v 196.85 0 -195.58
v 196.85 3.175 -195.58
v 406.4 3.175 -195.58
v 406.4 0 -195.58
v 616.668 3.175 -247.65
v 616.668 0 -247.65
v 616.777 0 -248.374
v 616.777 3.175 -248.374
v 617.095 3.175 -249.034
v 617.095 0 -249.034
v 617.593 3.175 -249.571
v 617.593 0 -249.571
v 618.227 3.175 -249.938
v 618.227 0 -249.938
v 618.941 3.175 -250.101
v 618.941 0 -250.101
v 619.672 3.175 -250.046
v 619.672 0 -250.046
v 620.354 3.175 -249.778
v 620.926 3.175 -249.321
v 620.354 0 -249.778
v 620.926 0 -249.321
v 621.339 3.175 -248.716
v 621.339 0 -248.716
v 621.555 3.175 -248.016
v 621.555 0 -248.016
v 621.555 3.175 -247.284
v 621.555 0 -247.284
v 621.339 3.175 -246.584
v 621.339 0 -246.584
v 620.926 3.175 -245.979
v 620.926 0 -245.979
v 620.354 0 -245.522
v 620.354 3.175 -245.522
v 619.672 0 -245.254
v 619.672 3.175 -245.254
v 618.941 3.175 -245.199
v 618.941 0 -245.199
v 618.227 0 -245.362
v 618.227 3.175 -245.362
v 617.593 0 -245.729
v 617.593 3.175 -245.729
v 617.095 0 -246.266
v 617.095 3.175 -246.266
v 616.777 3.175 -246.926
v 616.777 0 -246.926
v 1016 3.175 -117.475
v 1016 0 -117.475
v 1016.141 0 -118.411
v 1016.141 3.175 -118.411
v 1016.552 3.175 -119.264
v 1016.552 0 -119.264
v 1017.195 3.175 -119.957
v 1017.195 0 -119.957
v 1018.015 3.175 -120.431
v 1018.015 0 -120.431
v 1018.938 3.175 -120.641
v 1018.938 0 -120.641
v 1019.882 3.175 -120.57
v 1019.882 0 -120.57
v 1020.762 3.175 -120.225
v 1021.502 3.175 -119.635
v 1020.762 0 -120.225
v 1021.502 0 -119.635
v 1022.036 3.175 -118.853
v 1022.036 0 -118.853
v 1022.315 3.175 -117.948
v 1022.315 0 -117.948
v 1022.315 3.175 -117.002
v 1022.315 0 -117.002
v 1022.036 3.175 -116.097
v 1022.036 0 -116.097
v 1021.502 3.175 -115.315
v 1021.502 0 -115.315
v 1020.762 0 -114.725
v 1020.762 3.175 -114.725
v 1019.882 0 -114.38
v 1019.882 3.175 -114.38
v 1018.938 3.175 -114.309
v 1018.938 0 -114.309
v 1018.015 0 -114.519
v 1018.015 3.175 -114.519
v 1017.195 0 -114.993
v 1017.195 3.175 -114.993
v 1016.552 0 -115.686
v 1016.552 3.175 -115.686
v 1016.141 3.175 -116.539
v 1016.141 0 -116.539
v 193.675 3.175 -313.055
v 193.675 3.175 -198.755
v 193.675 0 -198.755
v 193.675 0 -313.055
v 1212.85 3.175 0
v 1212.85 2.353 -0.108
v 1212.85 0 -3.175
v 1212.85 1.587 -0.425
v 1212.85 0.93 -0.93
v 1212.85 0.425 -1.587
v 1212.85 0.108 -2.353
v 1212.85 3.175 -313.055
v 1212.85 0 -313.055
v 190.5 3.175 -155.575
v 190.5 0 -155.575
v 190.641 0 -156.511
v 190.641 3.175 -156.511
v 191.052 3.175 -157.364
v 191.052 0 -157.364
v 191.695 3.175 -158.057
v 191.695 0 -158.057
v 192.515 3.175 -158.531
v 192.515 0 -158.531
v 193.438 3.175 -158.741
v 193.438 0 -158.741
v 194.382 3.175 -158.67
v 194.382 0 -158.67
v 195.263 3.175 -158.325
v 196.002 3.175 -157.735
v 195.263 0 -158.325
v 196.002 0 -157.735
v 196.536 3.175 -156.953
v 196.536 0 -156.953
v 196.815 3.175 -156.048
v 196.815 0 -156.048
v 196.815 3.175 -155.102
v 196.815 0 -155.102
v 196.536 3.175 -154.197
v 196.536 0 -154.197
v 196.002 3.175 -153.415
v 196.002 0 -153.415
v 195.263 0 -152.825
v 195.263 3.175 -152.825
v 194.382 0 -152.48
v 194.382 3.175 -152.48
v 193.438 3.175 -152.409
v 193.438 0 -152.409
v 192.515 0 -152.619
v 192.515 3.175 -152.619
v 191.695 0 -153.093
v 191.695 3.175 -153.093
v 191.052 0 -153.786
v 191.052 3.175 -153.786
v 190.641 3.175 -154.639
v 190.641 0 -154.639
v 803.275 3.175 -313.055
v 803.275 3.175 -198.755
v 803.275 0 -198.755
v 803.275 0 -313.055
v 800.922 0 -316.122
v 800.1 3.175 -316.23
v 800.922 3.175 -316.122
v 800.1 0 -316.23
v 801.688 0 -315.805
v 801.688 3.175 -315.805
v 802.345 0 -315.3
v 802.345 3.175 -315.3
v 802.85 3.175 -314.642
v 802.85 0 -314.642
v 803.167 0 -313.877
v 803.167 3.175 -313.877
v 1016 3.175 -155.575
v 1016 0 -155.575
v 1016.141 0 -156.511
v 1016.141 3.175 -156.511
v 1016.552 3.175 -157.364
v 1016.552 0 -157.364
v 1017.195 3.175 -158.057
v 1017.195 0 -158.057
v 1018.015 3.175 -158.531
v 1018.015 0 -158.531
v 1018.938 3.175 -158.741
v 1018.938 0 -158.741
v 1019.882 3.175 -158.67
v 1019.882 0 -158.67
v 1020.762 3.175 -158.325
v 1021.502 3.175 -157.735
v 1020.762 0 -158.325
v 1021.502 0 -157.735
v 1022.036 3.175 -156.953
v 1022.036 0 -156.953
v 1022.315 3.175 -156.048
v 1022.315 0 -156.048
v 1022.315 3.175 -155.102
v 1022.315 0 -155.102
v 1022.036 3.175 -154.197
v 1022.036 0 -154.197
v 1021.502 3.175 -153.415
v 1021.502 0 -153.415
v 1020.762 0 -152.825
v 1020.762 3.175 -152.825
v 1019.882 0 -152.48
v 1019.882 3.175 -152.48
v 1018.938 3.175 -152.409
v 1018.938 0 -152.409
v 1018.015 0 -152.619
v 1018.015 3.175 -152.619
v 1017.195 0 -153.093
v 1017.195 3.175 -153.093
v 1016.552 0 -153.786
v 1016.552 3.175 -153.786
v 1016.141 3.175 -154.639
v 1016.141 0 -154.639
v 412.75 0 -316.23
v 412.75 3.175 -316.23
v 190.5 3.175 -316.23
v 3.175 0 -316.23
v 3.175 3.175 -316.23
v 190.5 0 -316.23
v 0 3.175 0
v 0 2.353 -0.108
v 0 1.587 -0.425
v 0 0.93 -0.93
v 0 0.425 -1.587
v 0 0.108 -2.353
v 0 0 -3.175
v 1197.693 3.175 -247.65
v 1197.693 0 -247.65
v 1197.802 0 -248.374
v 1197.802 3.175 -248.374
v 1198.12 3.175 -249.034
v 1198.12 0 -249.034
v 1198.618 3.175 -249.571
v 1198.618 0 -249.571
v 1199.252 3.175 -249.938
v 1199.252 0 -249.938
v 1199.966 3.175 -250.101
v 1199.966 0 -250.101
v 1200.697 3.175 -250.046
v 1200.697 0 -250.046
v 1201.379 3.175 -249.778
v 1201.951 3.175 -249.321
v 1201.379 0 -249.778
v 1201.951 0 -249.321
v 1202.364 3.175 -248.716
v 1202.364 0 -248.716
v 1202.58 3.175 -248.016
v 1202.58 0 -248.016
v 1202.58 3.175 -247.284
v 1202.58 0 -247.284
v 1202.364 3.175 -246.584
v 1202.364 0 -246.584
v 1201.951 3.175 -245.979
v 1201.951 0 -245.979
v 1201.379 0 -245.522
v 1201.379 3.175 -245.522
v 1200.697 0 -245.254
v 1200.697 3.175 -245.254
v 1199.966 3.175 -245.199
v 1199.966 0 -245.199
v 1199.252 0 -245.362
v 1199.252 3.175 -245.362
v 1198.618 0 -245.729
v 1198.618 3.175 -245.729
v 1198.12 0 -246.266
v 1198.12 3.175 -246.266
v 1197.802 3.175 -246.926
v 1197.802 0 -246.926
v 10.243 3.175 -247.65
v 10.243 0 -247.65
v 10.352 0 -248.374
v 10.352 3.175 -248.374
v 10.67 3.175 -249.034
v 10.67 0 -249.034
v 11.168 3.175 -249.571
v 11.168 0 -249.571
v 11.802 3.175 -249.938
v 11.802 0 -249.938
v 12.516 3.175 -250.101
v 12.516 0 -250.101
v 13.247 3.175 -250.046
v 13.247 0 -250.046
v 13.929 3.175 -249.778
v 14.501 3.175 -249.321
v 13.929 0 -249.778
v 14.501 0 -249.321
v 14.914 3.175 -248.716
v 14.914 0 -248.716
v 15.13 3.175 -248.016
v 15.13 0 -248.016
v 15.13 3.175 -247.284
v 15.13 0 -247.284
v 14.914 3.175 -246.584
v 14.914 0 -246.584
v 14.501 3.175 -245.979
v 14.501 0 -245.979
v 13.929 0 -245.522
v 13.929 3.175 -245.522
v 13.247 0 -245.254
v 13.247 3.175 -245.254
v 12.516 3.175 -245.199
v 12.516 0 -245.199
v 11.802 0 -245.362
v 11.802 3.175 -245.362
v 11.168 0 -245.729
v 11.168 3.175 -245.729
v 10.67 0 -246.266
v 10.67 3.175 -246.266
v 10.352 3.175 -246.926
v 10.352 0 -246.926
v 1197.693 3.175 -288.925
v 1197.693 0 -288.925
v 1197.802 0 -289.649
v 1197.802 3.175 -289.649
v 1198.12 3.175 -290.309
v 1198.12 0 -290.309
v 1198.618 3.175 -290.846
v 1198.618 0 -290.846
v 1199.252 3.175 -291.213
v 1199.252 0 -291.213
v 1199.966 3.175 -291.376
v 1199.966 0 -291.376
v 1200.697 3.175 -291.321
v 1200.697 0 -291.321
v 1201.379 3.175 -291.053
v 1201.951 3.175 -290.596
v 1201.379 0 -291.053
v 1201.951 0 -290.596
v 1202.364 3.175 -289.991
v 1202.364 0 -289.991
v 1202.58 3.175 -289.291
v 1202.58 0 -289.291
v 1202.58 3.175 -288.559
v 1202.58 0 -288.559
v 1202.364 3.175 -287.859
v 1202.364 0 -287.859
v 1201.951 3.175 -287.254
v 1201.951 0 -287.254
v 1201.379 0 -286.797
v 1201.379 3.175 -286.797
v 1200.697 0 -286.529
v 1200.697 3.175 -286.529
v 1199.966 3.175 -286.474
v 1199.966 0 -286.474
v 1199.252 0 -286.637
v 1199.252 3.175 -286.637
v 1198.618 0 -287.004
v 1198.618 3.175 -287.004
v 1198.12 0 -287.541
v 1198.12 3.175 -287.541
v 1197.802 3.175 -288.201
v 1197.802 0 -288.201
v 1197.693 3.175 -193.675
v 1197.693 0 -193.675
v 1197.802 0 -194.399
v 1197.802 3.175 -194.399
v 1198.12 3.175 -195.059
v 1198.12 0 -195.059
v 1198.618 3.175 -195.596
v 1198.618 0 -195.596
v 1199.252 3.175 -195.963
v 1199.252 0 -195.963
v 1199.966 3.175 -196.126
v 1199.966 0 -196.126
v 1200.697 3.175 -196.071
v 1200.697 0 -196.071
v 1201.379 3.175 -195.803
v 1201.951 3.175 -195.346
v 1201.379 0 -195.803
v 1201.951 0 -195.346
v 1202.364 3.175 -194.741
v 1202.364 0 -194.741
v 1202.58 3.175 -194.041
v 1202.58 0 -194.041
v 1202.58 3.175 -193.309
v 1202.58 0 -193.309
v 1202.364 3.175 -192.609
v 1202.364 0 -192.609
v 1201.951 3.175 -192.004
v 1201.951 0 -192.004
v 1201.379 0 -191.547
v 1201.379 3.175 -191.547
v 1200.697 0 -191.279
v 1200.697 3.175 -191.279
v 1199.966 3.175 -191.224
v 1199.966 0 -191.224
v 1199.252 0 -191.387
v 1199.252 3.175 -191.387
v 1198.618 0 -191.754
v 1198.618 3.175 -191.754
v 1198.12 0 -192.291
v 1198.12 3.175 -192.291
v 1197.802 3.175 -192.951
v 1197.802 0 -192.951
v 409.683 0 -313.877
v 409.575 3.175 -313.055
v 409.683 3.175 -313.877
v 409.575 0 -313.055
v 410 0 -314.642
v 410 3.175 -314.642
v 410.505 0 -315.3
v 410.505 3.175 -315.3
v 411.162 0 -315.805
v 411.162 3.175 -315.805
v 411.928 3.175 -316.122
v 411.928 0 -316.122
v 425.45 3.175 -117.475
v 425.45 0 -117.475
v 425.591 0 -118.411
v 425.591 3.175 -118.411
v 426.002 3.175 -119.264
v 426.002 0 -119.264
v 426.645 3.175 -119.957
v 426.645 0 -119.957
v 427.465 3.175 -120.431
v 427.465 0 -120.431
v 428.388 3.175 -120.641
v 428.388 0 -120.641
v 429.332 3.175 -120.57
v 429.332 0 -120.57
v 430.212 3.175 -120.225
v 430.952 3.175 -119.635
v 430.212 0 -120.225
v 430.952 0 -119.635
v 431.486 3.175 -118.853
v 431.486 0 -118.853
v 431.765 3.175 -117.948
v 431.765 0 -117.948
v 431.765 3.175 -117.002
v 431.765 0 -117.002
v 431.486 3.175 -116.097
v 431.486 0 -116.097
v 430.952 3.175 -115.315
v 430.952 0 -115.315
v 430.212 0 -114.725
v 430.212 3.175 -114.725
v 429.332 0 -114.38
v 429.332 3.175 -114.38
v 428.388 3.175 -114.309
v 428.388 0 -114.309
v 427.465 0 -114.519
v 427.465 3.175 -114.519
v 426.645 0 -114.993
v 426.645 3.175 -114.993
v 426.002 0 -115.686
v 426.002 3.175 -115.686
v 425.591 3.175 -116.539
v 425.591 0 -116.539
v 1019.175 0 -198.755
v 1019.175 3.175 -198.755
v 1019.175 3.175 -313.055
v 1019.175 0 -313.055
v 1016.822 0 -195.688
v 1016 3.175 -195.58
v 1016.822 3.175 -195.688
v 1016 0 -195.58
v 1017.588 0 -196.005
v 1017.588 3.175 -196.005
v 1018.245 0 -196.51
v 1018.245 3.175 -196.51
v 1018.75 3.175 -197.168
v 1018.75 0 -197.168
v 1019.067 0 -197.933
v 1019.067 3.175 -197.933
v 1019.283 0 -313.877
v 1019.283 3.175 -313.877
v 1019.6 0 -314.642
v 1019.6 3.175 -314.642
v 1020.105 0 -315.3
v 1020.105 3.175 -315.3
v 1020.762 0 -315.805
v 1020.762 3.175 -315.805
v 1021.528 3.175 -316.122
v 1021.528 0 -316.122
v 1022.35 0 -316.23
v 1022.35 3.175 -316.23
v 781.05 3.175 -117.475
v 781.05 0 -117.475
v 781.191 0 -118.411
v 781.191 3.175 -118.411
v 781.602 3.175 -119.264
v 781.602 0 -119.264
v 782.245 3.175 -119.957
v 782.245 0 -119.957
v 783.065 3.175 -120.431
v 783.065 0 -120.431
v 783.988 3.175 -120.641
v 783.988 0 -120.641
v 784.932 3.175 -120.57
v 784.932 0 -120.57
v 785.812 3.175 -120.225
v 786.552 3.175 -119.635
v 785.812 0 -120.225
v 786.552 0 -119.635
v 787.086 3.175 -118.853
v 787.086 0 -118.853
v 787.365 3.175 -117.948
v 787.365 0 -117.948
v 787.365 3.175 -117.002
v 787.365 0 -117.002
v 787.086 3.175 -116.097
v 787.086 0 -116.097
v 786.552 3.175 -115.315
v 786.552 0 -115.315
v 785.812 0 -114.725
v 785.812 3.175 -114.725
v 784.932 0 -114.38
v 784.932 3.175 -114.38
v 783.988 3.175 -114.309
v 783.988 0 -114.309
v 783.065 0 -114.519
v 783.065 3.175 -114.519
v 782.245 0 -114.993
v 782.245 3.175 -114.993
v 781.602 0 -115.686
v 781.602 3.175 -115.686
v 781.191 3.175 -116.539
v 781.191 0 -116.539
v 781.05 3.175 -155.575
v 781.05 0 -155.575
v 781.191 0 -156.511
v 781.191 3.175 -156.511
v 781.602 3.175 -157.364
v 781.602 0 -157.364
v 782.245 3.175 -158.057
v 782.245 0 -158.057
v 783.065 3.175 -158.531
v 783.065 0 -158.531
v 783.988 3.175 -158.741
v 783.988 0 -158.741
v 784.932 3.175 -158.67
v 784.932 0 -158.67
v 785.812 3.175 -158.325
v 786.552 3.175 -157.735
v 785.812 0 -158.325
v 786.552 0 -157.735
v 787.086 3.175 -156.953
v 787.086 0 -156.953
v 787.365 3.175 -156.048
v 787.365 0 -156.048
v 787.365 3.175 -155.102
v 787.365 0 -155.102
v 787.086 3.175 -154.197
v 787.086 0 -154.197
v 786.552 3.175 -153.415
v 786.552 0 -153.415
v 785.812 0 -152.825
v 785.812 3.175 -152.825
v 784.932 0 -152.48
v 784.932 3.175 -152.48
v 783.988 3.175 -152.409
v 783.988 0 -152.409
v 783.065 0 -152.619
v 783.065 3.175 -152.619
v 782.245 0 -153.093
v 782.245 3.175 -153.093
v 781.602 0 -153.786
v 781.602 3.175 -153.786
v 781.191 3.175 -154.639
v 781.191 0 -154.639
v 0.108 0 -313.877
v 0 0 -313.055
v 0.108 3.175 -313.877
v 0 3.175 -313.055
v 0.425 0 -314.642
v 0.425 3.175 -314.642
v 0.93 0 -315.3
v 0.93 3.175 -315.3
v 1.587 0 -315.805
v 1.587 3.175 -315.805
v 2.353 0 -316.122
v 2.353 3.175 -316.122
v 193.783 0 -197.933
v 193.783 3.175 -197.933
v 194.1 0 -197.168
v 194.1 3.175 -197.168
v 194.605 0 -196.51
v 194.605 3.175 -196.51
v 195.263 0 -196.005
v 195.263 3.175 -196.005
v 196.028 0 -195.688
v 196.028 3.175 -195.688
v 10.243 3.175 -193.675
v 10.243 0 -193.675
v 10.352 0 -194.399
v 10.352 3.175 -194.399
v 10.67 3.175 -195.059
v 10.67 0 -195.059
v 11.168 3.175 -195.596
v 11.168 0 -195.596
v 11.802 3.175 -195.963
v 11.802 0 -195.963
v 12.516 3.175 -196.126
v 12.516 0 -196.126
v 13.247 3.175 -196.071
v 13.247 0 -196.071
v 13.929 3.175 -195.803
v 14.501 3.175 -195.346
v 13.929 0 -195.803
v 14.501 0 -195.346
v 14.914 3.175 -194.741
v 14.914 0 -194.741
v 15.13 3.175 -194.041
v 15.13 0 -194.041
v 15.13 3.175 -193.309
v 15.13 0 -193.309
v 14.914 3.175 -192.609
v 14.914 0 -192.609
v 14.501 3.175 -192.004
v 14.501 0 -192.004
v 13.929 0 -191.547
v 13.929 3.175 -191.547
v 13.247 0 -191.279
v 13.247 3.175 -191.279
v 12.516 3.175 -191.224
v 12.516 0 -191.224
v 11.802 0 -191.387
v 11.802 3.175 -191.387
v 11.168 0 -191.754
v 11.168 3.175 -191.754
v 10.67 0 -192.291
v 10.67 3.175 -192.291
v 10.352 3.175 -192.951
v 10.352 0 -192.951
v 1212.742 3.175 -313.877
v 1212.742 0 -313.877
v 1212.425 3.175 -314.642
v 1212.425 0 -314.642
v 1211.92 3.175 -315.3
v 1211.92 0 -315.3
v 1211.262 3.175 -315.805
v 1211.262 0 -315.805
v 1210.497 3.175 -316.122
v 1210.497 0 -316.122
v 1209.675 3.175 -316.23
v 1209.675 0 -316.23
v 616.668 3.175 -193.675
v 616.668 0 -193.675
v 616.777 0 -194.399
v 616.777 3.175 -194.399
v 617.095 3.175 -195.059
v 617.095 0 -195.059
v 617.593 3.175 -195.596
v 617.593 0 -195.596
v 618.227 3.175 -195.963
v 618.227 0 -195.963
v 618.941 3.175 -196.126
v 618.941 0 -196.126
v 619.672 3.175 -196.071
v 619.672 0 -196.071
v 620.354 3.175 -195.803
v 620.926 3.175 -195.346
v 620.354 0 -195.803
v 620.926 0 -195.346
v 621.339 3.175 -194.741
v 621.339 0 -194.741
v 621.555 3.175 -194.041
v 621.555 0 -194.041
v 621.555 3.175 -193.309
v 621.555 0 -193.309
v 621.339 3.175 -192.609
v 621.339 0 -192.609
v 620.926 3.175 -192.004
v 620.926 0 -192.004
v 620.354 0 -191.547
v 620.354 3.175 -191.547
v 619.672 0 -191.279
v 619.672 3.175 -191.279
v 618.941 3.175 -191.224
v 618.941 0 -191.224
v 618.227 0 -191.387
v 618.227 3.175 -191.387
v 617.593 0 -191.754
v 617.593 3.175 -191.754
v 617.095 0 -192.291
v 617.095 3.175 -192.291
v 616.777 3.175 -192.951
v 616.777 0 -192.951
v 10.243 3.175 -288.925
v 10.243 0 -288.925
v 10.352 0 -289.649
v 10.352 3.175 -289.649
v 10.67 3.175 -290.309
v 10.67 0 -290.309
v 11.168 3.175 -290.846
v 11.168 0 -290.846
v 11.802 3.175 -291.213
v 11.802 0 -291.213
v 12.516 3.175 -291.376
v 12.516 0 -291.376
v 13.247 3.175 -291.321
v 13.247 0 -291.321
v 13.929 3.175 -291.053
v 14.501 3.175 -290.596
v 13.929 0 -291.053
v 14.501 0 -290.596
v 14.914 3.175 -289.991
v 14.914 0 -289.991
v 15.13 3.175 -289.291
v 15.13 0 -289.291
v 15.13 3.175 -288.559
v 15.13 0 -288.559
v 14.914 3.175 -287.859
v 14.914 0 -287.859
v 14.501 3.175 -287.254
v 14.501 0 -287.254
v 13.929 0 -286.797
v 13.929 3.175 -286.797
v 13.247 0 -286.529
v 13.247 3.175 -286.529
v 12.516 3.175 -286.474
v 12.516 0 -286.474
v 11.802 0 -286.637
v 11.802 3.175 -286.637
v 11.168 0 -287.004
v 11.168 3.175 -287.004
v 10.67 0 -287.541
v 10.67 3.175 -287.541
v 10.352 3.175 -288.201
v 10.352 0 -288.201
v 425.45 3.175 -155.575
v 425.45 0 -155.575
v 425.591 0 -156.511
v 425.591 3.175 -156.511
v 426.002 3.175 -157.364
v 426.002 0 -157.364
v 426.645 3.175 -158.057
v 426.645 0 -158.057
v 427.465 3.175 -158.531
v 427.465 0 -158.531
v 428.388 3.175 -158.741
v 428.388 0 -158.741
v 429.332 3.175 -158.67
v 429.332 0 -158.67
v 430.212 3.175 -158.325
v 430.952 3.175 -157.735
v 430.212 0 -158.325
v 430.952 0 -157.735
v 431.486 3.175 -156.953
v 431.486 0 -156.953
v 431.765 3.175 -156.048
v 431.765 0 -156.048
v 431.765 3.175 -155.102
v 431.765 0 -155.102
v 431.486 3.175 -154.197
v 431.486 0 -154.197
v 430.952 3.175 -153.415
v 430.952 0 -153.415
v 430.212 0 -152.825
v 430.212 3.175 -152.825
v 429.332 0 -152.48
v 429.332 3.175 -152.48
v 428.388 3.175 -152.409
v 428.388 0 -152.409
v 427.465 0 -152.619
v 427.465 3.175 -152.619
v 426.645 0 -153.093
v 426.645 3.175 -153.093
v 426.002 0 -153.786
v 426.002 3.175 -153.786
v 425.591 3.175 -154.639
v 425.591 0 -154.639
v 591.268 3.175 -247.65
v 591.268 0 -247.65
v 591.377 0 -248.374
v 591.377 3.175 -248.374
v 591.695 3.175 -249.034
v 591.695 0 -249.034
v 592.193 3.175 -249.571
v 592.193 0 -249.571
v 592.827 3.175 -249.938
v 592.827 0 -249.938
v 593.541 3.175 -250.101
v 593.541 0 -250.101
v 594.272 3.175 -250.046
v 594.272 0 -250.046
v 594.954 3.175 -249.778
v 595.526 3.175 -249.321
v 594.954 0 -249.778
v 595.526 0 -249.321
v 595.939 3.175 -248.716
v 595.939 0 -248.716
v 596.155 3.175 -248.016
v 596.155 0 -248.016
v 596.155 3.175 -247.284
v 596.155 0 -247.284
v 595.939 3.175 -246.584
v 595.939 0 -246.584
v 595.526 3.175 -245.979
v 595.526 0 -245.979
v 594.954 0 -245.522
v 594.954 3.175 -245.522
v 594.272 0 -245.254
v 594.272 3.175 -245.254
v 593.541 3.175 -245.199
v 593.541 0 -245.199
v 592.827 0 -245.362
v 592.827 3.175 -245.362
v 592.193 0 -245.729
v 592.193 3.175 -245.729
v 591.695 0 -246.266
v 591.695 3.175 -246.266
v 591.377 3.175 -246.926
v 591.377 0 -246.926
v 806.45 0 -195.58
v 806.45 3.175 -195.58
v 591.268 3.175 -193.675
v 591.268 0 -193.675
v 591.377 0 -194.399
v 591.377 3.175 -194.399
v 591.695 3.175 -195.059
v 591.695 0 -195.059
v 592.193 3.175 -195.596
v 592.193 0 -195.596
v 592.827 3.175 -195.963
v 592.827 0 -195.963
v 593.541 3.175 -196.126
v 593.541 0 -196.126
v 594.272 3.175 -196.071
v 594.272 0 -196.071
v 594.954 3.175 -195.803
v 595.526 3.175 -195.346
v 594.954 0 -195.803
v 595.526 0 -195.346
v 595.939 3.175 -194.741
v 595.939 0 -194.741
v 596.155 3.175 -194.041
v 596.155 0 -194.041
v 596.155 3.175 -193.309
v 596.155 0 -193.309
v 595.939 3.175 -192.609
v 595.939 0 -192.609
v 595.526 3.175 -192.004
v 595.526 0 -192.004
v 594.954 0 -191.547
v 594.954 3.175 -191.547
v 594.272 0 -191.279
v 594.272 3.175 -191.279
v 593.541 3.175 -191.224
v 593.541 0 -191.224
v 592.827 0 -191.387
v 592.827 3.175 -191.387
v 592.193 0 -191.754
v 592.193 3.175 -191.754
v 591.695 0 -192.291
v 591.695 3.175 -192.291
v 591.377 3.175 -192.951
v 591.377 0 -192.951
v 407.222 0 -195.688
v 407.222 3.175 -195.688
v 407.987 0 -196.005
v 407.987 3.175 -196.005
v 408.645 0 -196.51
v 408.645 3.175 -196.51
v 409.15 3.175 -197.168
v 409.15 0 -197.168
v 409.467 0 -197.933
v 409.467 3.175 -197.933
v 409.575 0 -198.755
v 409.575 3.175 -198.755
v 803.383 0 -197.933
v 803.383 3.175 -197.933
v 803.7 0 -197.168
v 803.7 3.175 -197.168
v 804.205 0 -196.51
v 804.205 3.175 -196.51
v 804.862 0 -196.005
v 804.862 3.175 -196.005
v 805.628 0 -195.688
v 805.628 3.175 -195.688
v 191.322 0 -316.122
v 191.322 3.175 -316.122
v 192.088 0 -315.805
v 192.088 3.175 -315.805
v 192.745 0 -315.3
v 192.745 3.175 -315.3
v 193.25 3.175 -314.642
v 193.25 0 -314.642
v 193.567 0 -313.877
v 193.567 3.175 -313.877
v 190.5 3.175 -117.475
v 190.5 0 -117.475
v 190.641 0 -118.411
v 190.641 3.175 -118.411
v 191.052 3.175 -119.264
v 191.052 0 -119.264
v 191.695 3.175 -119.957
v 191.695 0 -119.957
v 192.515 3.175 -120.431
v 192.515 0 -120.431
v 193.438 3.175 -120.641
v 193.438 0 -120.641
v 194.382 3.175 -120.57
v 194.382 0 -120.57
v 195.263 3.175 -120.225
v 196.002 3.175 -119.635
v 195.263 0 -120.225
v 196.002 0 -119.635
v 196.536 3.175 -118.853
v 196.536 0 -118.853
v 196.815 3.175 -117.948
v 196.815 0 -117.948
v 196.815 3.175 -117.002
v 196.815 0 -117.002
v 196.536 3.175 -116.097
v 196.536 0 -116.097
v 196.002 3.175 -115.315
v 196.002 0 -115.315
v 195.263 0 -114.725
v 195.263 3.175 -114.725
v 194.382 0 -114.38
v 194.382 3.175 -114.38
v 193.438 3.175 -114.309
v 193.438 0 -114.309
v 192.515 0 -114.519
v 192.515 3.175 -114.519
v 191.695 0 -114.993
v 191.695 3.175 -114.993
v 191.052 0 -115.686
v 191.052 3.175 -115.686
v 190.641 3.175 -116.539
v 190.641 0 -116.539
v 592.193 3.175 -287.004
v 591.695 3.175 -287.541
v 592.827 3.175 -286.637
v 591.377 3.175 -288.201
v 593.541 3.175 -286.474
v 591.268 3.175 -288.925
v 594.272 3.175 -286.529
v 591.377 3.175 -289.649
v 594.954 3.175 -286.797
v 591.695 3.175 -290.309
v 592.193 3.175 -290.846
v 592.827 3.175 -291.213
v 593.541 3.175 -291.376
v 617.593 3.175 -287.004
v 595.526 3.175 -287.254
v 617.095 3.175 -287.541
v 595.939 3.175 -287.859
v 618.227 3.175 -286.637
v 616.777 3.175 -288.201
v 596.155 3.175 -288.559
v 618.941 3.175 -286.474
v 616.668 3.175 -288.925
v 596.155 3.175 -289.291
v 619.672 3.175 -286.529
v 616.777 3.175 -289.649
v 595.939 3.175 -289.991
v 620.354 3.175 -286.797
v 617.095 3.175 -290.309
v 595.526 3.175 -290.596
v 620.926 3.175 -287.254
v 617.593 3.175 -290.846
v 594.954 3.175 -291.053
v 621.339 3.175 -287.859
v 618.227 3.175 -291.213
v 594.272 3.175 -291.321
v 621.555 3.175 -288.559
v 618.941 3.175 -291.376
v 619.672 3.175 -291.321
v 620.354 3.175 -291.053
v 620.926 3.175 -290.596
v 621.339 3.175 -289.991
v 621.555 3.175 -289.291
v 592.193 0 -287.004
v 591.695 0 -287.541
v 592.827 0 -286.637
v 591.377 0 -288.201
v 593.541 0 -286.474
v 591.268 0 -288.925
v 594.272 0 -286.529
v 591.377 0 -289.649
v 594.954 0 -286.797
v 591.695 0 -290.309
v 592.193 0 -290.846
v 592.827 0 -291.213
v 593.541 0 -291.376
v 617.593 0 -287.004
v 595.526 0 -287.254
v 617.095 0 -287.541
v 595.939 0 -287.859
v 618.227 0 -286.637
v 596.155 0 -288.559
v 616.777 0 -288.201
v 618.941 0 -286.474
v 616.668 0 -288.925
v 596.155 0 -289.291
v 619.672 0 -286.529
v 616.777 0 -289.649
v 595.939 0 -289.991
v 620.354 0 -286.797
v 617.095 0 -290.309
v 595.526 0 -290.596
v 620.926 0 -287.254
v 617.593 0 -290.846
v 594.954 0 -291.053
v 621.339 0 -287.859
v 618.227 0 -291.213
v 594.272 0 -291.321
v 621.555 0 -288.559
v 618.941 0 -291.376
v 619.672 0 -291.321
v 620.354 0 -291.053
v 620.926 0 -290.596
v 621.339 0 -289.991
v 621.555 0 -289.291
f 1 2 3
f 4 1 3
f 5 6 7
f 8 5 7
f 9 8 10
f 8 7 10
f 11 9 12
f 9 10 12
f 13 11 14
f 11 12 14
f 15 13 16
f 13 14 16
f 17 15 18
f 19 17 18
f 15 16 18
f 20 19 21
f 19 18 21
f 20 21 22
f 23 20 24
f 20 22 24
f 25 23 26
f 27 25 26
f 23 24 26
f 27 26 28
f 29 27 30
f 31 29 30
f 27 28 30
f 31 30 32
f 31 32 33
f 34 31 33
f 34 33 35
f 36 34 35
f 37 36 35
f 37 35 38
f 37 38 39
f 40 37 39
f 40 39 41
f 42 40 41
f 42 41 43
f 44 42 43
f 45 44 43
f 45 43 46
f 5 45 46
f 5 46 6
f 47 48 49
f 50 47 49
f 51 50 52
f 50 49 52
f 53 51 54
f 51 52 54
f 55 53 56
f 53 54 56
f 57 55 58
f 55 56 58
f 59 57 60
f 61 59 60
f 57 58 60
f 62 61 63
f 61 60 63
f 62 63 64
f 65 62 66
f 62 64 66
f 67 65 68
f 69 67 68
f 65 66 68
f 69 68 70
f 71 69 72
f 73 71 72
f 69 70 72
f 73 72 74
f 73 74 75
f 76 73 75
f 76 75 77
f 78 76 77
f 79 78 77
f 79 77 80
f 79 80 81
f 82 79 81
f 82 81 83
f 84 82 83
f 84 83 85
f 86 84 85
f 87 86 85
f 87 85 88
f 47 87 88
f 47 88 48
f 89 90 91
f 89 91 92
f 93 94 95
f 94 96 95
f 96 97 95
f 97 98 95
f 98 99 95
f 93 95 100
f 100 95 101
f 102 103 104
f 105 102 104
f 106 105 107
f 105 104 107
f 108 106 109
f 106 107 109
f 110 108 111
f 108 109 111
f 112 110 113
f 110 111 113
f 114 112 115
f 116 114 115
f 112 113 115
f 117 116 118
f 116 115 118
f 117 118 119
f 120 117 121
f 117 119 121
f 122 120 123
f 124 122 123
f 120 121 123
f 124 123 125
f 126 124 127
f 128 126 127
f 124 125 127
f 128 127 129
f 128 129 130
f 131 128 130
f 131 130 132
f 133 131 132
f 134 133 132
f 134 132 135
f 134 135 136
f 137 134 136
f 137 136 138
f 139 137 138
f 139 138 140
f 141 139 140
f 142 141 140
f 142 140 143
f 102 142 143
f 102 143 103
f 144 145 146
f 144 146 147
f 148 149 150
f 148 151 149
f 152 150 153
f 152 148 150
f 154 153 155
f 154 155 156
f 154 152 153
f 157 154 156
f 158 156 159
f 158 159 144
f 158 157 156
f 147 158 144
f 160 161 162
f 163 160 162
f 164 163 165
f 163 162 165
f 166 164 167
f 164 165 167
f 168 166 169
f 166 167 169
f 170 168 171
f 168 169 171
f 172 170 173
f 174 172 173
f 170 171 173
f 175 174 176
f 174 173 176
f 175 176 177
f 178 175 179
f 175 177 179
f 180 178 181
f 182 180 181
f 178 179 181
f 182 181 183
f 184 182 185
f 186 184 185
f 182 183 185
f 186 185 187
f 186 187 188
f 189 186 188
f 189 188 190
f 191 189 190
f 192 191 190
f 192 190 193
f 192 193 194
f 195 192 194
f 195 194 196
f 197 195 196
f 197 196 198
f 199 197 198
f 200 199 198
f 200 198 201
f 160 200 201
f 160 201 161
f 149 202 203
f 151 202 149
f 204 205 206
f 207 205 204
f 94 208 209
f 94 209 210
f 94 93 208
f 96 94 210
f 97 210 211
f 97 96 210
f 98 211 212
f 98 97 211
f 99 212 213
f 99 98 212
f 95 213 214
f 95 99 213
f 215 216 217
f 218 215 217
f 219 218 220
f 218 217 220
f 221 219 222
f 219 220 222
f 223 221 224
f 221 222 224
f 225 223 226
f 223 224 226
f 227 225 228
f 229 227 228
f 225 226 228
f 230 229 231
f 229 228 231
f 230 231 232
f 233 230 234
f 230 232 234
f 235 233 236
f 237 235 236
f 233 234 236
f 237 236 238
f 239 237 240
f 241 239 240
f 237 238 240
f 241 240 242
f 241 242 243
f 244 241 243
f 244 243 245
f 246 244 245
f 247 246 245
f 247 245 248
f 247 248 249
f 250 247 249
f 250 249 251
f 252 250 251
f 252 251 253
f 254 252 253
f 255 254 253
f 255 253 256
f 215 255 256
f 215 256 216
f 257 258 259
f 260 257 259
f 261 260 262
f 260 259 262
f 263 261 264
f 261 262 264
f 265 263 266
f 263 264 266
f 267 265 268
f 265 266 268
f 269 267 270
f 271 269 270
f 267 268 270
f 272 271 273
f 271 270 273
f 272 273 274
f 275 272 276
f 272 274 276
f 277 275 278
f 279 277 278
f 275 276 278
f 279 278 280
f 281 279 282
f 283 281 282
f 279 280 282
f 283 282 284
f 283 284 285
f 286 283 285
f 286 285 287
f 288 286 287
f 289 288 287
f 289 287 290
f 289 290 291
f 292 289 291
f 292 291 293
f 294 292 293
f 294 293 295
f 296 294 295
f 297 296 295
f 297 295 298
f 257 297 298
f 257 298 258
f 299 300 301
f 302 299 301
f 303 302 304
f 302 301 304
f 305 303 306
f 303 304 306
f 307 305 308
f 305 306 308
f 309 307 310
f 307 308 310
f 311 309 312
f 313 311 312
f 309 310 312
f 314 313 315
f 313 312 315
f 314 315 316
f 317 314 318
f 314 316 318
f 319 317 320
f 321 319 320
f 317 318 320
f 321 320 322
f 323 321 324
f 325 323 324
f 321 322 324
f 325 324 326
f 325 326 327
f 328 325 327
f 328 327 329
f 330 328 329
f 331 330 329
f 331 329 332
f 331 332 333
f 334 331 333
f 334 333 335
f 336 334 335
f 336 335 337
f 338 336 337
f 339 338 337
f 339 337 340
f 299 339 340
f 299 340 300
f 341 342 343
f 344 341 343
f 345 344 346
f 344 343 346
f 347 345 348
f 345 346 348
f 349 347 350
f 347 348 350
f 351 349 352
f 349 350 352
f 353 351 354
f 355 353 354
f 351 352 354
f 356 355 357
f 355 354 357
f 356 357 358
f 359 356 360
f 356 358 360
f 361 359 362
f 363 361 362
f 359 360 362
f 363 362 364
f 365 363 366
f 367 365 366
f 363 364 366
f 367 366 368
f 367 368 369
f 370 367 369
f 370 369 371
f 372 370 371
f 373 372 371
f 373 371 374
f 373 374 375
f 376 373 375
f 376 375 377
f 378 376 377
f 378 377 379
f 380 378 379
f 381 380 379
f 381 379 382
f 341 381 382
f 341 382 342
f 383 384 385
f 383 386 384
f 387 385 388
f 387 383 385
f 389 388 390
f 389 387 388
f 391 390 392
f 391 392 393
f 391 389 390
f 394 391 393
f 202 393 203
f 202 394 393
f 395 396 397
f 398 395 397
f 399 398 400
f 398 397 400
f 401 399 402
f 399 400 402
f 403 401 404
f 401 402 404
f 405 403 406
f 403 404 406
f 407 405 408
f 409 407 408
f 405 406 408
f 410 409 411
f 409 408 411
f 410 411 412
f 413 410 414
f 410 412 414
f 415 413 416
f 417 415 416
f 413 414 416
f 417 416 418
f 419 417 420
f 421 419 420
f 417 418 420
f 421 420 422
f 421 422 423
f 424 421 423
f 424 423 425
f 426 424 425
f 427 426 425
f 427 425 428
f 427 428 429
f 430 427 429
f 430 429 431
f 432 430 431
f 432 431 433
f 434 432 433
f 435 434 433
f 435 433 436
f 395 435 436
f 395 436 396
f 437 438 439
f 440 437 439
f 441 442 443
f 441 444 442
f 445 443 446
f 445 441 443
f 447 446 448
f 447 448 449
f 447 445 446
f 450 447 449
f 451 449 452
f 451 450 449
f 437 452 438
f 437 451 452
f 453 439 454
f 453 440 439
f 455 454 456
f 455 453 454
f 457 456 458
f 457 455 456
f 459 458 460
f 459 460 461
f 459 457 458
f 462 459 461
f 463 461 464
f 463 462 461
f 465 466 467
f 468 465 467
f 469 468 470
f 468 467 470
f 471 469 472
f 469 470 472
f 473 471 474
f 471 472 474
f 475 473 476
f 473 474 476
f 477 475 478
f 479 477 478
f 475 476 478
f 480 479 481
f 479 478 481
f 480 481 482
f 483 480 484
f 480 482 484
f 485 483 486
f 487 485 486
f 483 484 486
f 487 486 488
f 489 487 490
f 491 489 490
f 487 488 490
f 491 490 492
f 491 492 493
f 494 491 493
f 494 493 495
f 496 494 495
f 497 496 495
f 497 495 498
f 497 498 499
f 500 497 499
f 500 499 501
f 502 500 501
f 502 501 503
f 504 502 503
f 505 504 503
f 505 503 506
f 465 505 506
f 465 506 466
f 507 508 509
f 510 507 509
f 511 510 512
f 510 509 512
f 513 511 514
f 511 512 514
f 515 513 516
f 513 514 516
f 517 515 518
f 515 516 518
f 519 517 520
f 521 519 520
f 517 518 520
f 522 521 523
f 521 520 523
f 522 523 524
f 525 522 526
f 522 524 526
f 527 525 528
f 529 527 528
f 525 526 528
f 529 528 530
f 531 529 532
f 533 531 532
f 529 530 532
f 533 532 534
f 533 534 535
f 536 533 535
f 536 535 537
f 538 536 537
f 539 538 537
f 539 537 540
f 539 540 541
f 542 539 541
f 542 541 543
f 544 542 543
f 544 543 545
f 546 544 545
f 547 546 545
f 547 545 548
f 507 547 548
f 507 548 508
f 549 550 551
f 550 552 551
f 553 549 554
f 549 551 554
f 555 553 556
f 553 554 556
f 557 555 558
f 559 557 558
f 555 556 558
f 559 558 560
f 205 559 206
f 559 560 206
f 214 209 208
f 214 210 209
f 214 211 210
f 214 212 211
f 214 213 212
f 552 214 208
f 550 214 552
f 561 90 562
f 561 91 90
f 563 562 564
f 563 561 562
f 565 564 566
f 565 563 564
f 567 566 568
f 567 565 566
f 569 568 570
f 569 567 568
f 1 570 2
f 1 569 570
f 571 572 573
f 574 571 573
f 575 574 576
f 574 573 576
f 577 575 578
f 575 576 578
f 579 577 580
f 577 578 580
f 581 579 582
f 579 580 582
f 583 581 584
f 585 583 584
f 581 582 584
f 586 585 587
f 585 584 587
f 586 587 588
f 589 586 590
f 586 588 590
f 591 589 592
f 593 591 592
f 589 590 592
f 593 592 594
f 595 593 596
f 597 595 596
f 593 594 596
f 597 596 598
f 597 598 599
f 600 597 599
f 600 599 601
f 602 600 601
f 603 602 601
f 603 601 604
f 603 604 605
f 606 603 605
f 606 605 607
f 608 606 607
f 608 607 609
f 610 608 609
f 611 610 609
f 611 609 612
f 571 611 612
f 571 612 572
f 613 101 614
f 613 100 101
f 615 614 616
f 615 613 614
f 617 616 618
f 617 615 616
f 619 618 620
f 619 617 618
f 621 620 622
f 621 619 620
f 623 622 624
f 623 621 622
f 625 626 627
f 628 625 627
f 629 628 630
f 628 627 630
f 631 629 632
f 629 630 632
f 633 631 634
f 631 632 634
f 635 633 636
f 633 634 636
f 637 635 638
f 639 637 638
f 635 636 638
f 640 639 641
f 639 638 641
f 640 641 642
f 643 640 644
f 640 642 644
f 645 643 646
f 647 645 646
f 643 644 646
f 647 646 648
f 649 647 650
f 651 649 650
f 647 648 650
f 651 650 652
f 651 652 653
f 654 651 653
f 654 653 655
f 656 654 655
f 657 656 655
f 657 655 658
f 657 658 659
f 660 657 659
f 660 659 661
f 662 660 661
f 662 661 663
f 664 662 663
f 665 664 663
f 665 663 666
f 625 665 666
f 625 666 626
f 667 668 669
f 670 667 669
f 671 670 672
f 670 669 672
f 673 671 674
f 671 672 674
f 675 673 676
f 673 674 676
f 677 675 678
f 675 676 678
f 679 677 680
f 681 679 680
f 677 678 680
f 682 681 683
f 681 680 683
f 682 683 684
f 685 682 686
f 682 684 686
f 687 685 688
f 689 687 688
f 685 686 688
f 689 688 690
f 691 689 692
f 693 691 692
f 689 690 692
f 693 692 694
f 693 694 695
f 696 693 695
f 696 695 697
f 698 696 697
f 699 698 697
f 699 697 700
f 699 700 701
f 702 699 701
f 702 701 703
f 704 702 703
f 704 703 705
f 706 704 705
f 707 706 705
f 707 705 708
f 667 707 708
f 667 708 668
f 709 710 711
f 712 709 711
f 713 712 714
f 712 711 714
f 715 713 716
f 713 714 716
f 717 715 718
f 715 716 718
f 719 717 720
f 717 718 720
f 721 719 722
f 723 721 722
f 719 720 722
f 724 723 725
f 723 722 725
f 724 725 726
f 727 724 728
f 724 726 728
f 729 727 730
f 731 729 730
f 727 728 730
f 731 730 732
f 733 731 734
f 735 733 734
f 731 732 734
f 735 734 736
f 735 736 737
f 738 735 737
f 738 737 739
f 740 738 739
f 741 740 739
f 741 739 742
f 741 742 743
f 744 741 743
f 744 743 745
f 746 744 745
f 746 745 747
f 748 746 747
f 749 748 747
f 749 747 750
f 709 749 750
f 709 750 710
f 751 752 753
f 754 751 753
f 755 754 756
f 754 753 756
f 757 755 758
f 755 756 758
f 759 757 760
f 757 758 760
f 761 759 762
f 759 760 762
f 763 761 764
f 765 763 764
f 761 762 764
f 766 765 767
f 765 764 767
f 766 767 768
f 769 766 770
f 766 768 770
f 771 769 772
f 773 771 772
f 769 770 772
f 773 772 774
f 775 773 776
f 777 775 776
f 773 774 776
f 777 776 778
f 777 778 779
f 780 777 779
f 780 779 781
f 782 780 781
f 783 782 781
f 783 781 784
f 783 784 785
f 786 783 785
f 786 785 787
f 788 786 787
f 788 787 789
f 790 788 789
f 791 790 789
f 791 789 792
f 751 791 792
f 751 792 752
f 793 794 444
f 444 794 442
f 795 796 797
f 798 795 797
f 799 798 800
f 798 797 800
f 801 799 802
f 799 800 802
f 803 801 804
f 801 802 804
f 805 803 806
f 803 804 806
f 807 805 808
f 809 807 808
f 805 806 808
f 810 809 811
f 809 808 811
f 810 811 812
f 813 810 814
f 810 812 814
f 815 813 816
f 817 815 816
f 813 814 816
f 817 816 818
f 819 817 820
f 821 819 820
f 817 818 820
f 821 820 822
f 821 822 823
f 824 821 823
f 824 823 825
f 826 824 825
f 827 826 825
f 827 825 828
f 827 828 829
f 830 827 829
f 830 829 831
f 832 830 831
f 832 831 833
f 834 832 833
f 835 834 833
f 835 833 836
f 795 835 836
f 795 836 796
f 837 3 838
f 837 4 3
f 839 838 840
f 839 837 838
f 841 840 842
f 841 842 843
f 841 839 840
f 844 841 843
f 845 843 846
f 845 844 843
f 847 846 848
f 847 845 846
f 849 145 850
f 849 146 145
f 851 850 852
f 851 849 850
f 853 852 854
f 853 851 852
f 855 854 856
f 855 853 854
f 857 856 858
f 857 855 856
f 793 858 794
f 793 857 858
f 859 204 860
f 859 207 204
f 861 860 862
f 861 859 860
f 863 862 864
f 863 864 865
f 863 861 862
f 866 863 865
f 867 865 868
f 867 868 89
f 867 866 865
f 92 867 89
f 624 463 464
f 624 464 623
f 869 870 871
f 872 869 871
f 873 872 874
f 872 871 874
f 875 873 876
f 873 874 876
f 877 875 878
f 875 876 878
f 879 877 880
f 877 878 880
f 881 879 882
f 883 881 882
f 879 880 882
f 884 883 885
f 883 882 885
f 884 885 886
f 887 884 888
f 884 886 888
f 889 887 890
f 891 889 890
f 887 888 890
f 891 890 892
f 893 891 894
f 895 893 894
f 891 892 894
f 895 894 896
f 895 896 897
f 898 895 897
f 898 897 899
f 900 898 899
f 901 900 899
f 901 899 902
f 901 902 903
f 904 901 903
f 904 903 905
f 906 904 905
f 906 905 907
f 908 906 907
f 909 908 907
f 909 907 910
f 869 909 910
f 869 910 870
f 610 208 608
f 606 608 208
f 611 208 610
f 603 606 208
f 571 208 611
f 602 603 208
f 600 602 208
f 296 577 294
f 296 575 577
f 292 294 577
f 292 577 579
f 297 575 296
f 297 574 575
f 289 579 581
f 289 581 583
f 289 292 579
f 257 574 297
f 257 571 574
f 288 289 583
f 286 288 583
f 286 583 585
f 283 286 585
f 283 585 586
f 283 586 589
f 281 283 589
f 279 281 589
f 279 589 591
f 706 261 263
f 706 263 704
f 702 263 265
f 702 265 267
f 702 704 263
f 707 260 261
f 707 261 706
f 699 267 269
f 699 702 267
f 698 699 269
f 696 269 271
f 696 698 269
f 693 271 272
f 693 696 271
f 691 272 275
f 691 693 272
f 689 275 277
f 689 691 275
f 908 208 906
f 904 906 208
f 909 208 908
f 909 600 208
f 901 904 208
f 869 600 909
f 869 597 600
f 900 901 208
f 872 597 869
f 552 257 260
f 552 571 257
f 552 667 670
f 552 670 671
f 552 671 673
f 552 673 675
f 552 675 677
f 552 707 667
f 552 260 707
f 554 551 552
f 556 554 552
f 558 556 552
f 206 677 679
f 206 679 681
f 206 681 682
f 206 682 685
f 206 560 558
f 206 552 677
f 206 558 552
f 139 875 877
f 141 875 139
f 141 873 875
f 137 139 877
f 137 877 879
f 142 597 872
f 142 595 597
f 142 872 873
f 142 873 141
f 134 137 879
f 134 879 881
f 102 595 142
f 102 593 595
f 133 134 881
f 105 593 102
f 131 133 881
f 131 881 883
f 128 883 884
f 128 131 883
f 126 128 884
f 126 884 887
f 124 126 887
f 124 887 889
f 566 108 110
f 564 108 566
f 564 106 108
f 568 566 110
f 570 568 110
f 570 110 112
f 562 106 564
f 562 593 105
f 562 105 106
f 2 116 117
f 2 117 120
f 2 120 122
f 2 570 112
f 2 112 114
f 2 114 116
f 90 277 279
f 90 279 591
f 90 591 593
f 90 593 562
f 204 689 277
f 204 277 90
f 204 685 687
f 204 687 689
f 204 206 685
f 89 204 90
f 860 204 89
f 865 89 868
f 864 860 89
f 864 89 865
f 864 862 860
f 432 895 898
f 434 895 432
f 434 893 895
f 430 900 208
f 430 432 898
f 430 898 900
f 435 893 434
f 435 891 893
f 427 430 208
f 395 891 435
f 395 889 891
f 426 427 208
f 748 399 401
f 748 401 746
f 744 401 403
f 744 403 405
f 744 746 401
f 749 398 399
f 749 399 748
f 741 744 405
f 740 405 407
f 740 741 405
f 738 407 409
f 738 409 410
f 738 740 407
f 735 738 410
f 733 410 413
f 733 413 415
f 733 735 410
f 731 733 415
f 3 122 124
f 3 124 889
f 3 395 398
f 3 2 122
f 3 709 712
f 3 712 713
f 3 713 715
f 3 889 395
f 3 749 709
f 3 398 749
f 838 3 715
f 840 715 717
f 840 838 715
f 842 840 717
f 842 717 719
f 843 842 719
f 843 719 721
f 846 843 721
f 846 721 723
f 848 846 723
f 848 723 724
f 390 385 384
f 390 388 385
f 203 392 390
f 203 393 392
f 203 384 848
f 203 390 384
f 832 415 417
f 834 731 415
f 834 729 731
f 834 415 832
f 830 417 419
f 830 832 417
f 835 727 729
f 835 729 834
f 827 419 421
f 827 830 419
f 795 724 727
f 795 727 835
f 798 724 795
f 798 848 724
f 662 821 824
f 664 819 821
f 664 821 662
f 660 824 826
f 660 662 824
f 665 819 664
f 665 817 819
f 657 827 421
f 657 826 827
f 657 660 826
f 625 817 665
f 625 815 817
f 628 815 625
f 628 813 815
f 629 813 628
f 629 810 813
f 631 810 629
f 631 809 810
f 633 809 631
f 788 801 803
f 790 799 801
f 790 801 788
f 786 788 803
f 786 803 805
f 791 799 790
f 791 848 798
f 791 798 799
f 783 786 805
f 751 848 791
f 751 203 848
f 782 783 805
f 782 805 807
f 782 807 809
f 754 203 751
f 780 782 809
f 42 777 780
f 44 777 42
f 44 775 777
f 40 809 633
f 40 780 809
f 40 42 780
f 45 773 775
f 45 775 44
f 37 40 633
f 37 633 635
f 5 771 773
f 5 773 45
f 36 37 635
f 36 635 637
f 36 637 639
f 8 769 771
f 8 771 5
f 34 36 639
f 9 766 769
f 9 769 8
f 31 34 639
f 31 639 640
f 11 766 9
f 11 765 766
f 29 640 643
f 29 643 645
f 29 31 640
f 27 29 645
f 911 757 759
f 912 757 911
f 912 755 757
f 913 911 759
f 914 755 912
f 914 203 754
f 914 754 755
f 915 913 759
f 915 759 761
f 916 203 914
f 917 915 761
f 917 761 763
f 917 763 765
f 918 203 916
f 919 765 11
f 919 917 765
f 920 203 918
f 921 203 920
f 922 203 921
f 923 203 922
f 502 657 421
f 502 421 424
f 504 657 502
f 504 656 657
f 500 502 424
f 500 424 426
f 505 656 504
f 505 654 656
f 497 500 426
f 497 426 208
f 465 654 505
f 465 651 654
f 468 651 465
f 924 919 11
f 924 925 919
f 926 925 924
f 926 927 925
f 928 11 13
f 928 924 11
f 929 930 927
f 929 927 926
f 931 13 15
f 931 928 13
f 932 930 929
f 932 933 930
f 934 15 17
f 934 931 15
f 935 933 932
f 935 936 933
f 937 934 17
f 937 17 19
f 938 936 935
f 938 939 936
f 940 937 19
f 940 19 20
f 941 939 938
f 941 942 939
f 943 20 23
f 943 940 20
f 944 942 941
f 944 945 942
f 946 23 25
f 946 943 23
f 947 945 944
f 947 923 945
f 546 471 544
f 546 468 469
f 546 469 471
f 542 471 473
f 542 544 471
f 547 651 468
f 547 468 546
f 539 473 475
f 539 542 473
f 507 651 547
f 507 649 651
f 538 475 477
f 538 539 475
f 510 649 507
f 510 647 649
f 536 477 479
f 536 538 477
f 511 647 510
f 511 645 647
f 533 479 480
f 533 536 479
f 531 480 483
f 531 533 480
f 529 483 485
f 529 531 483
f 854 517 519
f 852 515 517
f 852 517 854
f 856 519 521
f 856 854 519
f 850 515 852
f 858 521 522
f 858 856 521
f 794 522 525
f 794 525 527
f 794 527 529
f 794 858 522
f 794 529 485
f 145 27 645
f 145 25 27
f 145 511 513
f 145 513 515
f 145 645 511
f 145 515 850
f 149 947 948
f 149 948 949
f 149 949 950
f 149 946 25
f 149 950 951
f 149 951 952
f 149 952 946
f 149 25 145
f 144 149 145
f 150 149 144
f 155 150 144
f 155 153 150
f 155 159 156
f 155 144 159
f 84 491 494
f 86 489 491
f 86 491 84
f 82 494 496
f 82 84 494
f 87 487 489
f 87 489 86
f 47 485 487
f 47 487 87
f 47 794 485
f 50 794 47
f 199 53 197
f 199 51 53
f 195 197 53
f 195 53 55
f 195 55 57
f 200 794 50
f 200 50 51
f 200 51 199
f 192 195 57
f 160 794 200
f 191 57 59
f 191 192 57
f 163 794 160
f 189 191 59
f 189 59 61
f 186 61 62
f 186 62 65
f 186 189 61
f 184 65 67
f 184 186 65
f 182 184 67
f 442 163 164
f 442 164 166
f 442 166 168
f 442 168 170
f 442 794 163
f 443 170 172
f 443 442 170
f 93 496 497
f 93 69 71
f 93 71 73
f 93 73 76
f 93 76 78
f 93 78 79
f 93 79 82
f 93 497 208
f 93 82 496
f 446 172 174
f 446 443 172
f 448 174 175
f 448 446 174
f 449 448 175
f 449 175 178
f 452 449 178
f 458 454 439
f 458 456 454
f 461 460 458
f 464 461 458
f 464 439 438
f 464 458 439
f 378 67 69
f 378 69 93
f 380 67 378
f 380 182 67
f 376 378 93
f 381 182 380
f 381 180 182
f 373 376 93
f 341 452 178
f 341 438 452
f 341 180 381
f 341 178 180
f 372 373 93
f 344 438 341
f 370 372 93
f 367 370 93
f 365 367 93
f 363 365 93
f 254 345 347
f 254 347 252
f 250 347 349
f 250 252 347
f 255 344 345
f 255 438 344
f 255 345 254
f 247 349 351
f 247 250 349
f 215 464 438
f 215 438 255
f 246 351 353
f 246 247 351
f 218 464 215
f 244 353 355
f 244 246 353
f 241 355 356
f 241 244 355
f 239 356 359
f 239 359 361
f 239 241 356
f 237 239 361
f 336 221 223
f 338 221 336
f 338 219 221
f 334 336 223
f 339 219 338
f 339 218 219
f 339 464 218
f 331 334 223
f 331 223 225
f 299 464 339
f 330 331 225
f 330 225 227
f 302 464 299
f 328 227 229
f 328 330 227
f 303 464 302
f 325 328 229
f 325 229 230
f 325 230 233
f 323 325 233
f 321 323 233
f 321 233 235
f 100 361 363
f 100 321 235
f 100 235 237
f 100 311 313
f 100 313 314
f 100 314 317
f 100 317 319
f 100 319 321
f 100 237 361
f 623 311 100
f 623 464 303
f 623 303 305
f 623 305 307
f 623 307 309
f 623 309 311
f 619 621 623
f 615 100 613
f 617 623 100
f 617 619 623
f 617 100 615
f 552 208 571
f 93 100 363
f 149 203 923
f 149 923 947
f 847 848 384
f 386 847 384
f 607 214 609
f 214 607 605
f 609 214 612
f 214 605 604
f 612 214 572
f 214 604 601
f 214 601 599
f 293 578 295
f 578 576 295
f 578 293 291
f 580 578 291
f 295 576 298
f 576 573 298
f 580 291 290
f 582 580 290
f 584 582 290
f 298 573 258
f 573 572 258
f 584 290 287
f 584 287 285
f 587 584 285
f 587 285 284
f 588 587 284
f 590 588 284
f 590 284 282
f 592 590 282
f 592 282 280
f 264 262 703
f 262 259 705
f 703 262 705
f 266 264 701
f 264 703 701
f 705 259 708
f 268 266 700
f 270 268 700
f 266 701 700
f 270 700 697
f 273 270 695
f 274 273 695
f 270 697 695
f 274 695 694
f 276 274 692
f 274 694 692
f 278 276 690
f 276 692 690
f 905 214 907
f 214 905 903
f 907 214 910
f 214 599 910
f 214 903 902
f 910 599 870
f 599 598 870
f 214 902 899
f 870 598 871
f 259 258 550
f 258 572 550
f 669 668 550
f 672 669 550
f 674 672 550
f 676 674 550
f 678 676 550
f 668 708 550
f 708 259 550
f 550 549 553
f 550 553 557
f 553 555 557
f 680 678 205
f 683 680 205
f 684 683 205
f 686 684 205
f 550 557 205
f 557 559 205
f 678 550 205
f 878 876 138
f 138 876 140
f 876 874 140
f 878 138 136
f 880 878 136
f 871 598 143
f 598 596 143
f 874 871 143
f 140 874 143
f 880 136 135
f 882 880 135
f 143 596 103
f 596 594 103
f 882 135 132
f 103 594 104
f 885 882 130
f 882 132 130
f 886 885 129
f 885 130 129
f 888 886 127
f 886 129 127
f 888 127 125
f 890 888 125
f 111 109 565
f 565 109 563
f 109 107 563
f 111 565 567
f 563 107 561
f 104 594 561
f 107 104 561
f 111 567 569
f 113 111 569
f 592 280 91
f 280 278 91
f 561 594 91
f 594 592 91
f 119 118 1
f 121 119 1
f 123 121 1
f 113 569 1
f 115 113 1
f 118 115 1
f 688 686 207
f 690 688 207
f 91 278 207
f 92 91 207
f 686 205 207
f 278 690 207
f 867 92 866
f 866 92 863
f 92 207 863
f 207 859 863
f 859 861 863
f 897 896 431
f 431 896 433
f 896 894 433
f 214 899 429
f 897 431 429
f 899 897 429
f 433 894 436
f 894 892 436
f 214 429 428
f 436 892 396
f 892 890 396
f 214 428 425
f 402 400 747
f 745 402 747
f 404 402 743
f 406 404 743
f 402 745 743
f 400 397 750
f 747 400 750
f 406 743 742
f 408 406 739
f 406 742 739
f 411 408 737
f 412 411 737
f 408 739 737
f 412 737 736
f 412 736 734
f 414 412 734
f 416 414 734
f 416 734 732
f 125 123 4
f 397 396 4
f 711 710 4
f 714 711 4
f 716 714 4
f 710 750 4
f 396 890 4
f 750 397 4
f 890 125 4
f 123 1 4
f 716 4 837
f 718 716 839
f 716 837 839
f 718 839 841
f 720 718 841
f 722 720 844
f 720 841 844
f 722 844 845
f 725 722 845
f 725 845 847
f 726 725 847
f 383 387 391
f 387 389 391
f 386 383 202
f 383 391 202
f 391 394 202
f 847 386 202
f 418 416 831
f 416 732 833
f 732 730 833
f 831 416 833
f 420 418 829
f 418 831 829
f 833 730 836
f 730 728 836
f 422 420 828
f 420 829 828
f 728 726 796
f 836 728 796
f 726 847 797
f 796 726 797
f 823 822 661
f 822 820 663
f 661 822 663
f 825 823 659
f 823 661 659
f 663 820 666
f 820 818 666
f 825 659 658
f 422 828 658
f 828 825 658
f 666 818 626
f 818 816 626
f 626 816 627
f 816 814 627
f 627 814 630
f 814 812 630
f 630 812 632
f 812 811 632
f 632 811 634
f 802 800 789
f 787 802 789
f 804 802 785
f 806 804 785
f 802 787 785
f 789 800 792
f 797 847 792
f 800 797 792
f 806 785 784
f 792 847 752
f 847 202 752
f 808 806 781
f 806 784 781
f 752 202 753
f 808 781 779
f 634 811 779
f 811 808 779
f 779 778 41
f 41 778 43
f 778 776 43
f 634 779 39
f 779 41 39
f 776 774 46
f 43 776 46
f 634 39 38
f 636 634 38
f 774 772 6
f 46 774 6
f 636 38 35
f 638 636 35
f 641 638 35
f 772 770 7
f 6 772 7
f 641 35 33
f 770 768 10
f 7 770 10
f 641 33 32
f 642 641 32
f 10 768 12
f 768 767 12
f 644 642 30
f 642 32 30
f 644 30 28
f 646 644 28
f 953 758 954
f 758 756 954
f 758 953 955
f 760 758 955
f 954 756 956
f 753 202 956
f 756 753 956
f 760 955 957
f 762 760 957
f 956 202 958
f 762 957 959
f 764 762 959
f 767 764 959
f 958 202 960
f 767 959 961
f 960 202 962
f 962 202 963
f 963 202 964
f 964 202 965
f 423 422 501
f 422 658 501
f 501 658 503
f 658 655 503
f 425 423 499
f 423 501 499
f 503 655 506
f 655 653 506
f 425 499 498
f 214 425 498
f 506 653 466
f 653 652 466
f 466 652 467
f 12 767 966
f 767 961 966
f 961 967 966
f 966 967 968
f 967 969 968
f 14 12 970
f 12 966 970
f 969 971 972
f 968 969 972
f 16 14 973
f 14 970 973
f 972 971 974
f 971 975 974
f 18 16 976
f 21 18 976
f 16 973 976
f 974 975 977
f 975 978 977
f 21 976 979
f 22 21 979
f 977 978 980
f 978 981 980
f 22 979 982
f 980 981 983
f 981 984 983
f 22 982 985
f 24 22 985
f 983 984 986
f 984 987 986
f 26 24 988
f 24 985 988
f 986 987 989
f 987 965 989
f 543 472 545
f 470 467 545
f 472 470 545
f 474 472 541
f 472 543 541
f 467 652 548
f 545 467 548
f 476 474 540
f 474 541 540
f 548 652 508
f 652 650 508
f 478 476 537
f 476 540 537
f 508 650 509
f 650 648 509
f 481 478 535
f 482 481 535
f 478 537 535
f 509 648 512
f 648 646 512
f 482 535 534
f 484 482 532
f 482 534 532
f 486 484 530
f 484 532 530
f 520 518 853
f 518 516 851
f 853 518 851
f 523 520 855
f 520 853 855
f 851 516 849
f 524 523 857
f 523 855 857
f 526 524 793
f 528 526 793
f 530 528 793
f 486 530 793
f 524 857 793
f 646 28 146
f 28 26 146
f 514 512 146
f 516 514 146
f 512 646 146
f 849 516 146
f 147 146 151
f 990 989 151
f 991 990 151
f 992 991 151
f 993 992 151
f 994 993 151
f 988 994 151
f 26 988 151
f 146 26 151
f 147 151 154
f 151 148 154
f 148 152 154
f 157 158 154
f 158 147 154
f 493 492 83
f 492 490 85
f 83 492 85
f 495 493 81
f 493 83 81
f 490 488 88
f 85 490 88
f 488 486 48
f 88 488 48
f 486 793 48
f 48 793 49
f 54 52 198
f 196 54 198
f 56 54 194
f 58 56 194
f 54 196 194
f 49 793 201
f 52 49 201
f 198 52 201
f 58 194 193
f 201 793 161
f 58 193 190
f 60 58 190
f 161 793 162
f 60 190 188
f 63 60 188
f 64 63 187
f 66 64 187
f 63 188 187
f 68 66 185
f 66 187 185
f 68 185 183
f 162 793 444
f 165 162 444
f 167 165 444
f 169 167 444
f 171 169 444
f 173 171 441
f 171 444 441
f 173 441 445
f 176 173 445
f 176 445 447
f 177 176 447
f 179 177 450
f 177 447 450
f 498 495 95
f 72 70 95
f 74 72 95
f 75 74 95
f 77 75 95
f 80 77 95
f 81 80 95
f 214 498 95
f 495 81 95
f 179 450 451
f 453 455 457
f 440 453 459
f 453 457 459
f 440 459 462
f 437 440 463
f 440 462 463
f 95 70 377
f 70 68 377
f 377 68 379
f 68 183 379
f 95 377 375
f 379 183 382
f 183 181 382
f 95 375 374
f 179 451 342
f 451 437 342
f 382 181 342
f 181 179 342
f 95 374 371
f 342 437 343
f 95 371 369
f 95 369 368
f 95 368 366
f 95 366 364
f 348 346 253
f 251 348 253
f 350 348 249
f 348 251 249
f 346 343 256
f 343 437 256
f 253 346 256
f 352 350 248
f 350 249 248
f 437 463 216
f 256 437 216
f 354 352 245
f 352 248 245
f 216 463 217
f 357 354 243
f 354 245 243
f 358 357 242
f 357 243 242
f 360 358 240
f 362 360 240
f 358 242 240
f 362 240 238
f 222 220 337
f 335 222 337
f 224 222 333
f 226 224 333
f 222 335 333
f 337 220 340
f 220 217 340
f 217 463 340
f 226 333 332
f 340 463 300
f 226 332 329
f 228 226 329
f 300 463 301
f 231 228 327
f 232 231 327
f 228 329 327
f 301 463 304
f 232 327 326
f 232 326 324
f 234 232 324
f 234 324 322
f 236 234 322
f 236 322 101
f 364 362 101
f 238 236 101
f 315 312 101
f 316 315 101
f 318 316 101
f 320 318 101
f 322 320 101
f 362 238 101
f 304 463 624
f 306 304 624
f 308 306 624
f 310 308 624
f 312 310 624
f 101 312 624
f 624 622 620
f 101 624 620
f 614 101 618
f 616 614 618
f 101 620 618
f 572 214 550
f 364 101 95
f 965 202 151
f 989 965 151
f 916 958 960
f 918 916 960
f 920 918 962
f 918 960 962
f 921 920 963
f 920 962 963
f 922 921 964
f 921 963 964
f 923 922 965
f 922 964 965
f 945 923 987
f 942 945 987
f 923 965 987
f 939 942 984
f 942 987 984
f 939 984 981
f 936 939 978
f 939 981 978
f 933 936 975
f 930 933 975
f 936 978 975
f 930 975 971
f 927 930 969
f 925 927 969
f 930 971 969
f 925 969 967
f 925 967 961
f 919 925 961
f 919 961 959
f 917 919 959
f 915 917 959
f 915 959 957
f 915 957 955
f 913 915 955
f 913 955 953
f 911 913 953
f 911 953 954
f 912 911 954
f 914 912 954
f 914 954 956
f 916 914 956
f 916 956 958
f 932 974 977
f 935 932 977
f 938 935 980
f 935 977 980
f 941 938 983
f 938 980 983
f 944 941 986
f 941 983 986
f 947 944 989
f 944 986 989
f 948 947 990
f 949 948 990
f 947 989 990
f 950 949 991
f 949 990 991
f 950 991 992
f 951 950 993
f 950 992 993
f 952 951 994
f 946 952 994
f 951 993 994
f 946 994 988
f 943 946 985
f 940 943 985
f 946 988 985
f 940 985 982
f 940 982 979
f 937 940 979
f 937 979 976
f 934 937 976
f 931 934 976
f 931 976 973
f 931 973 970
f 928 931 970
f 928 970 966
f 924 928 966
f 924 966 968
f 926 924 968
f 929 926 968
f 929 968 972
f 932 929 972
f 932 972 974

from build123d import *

# Parameters (mm, degrees)
SKETCH1_W                    = 1212.85
SKETCH1_H                    = 316.23
BOSS_EXTRUDE1_DEPTH          = 3.175
FILLET1_R                    = 3.175
SKETCH4_W                    = 215.9
SKETCH4_H                    = 120.65
CUT_EXTRUDE1_DEPTH           = 1254.402016922
FILLET2_R                    = 3.175
F_10_0_1935_DIAMETER_HOLE1_D = 4.9149
F_1_4_0_25_DIAMETER_HOLE1_D  = 6.35


with BuildPart() as part:
    # Sketch1 → Boss-Extrude1 (new body)
    with BuildSketch(Plane(origin=(0, 0, 0), x_dir=(1, 0, 0), z_dir=(0, 1, 0))):
        with Locations((606.425, 158.115)):
            Rectangle(SKETCH1_W, SKETCH1_H)
    extrude(amount=BOSS_EXTRUDE1_DEPTH)

    # Fillet1
    fillet1_edges = [part.edges().sort_by_distance(p)[0] for p in [
        (606.425, 0, 0),
    ]]
    fillet(fillet1_edges, radius=FILLET1_R - 0.0001)  # a hair under: the kernel refuses the full size

    # Sketch4 → Cut-Extrude1 (cut, through all)
    with BuildSketch(Plane(origin=(0, 3.175, 0), x_dir=(1, 0, 0), z_dir=(0, 1, 0))):
        with Locations((301.625, 255.905)):
            Rectangle(SKETCH4_W, SKETCH4_H)
        with Locations((911.225, 255.905)):
            Rectangle(SKETCH4_W, SKETCH4_H)
    extrude(amount=-CUT_EXTRUDE1_DEPTH, mode=Mode.SUBTRACT)

    # Fillet2
    fillet2_edges = [part.edges().sort_by_distance(p)[0] for p in [
        (193.675, 1.5875, -195.58),
        (193.675, 1.5875, -316.23),
        (409.575, 1.5875, -316.23),
        (409.575, 1.5875, -195.58),
        (803.275, 1.5875, -316.23),
        (1019.175, 1.5875, -316.23),
        (1019.175, 1.5875, -195.58),
        (803.275, 1.5875, -195.58),
        (0, 1.5875, -316.23),
        (1212.85, 1.5875, -316.23),
    ]]
    fillet(fillet2_edges, radius=FILLET2_R)

    # #10 (0.1935) Diameter Hole1 (through all)
    with Locations(Plane(origin=(0, 3.175, 0), x_dir=(1, 0, 0), z_dir=(0, 1, 0))):
        with Locations((12.7, 193.675), (12.7, 247.65), (12.7, 288.925), (593.725, 193.675), (593.725, 247.65), (593.725, 288.925), (619.125, 288.925), (619.125, 247.65), (619.125, 193.675), (1200.15, 288.925), (1200.15, 247.65), (1200.15, 193.675)):
            Hole(F_10_0_1935_DIAMETER_HOLE1_D / 2)

    # 1/4 (0.25) Diameter Hole1 (through all)
    with Locations(Plane(origin=(0, 3.175, 0), x_dir=(1, 0, 0), z_dir=(0, 1, 0))):
        with Locations((193.675, 155.575), (193.675, 117.475), (428.625, 155.575), (428.625, 117.475), (784.225, 117.475), (784.225, 155.575), (1019.175, 117.475), (1019.175, 155.575)):
            Hole(F_1_4_0_25_DIAMETER_HOLE1_D / 2)


solid = part.part
